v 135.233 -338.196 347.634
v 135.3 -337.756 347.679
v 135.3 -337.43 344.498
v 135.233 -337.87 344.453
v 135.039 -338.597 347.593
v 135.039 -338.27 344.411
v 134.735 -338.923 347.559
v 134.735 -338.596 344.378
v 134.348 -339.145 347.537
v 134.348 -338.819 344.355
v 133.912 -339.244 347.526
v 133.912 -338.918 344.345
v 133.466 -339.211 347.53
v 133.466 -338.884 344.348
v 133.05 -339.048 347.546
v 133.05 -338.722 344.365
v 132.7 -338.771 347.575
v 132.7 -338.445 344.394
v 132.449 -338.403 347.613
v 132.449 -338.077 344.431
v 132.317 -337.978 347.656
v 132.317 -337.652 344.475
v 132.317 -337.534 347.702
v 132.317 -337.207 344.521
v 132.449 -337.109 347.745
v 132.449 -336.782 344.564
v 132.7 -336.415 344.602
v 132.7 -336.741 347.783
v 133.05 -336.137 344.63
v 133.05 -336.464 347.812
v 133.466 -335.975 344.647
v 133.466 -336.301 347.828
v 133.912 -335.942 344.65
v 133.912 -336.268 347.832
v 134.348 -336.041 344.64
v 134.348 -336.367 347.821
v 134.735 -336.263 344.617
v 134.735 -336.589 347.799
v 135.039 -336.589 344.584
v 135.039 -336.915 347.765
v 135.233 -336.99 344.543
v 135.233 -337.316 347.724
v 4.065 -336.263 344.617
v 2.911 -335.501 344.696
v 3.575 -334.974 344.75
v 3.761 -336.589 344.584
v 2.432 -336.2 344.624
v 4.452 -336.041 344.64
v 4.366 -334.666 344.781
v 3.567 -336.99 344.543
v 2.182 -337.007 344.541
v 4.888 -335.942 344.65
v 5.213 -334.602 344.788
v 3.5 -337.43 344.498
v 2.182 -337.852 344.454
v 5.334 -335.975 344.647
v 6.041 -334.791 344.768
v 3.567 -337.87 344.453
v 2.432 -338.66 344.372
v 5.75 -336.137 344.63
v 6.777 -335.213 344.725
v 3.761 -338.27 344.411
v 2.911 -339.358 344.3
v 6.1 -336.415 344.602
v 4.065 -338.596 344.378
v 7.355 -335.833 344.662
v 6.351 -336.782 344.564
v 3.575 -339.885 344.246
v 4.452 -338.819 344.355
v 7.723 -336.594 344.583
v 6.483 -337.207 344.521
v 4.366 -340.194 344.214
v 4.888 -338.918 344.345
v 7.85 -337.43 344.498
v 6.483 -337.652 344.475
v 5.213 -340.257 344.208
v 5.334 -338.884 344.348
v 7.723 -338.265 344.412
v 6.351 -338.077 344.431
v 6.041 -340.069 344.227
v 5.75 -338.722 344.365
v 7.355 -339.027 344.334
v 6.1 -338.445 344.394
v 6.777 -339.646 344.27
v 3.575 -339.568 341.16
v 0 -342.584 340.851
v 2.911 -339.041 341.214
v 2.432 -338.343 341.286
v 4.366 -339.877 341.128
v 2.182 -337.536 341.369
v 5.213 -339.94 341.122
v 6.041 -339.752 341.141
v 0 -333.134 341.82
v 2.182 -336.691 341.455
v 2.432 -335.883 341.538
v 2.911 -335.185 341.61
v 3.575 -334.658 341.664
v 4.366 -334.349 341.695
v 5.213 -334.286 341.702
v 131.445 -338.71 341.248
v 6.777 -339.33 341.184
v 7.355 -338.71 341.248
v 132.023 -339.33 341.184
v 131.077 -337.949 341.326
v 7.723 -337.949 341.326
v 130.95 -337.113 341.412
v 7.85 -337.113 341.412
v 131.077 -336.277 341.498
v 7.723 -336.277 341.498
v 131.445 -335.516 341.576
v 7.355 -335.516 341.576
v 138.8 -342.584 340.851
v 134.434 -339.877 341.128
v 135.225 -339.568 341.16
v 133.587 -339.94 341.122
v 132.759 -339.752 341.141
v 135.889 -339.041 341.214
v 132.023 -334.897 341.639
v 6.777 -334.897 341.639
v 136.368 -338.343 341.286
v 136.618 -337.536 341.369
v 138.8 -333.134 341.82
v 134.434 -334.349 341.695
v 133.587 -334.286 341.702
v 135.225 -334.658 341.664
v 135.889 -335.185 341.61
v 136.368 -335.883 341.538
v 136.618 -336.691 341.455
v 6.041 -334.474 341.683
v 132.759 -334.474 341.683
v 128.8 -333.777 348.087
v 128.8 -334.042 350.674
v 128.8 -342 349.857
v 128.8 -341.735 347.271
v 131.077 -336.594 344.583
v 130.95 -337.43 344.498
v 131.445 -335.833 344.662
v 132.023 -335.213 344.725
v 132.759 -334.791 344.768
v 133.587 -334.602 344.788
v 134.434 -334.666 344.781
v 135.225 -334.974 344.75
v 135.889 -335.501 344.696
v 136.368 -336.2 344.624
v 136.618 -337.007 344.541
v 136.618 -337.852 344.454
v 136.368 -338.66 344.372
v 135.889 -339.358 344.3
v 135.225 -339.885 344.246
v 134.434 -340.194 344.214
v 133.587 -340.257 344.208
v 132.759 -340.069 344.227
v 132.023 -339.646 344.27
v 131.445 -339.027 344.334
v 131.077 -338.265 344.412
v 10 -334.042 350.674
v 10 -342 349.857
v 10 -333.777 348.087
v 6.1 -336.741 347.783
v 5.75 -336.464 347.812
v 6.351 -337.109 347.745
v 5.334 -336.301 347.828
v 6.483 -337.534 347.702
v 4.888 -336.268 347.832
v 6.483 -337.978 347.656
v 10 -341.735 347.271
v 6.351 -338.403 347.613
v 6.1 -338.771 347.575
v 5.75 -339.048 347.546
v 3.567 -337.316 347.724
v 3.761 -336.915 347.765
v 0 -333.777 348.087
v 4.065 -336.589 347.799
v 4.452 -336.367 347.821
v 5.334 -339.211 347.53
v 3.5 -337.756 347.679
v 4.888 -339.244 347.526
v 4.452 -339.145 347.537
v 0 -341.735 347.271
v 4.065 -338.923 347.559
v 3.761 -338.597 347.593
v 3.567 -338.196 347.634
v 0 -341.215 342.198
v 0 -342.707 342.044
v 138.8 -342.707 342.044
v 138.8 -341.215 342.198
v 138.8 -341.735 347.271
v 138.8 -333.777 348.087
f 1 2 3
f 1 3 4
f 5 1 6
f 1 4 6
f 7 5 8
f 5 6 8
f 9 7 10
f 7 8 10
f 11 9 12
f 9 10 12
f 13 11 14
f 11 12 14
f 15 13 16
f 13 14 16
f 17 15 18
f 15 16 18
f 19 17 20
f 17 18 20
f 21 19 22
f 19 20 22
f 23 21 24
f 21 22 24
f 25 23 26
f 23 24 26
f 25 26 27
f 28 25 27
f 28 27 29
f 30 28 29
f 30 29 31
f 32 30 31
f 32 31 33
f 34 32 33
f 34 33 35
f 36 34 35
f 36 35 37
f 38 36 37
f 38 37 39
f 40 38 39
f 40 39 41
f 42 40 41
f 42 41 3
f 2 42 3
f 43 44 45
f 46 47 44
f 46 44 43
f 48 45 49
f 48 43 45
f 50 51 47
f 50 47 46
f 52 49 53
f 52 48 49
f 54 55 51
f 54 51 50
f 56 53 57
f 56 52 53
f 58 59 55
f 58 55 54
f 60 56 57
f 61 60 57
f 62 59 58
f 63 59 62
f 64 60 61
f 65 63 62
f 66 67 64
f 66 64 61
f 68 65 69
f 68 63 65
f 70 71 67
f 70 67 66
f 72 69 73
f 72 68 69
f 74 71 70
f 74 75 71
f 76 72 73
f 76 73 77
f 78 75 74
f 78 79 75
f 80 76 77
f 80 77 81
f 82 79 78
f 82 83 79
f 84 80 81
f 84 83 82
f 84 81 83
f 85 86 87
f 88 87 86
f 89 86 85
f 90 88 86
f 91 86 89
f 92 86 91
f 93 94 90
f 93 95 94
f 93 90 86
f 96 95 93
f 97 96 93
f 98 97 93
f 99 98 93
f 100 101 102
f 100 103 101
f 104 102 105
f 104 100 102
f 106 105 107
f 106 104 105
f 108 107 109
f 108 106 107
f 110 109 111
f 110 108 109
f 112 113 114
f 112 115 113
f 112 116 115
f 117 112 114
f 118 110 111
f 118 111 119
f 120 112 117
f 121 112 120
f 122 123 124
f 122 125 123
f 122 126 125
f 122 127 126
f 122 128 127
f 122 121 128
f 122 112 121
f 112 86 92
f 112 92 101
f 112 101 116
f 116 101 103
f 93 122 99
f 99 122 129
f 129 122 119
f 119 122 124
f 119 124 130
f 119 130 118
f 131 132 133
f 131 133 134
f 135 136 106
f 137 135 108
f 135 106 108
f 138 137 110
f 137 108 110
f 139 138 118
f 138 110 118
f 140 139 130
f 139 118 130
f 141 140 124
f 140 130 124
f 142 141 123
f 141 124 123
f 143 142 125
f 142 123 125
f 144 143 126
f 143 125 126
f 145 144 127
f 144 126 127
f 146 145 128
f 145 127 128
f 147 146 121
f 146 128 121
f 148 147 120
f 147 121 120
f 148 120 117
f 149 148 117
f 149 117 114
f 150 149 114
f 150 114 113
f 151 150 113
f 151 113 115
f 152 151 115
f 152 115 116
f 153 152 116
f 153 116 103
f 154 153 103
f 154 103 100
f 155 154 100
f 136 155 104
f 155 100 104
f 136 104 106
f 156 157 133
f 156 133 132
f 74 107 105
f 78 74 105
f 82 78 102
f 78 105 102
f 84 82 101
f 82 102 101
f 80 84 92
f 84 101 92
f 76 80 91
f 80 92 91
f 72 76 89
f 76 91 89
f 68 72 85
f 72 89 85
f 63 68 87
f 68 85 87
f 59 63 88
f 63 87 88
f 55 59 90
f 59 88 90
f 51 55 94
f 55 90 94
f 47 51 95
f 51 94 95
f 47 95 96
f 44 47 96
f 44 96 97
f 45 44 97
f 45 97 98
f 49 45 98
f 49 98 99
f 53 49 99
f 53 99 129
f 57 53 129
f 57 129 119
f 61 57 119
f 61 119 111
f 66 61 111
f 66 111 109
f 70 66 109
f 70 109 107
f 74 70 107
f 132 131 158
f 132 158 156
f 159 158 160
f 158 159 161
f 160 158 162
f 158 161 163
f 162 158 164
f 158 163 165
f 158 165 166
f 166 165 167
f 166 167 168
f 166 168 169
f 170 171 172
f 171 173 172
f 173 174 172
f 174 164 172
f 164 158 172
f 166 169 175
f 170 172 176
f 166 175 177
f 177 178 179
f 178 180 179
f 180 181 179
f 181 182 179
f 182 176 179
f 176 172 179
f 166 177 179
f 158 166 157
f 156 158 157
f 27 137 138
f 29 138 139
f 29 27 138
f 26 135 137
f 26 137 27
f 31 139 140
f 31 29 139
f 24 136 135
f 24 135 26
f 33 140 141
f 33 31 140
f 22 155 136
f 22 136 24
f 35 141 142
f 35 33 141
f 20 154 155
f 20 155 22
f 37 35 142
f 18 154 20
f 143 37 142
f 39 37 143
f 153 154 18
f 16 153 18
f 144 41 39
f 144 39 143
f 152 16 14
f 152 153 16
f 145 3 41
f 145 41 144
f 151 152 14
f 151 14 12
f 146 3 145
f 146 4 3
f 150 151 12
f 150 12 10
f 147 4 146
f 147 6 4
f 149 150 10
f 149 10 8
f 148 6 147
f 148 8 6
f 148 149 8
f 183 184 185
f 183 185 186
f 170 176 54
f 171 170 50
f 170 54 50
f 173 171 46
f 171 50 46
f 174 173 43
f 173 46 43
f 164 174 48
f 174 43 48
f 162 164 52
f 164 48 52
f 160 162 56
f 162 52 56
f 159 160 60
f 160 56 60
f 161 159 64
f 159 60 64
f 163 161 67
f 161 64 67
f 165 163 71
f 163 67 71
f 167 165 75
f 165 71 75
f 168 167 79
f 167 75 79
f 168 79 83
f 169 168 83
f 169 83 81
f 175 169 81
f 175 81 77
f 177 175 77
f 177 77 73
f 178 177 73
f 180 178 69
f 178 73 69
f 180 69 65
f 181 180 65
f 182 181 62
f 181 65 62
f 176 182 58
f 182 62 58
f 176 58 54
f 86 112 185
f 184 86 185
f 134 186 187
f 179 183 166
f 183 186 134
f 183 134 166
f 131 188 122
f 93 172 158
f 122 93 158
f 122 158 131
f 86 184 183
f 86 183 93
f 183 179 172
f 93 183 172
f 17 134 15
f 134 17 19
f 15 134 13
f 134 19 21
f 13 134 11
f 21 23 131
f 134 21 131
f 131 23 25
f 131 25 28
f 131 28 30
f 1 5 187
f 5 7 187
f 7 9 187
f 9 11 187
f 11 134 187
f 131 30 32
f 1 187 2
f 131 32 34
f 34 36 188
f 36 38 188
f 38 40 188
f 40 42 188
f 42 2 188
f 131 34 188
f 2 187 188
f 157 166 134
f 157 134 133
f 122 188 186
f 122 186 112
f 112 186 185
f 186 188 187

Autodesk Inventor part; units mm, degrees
ref_plane "YZ Plane" through (0, 0, 0) normal (1, 0, 0) x (0, 1, 0)
ref_plane "XZ Plane" through (0, 0, 0) normal (0, 1, 0) x (-1, 0, 0)
ref_plane "XY Plane" through (0, 0, 0) normal (0, 0, 1) x (1, 0, 0)
sketch "Skizze2" plane through (0, 0, 0) normal (1, 0, 0) x (0, 1, 0)
  line L0 (-333.777, 348.0872) -> (-334.0423, 350.6737)
  line L1 (-333.777, 348.0872) -> (-333.134, 341.8201)
  line L2 (-333.134, 341.8201) -> (-342.5844, 340.8506)
  line L3 (-342.0005, 349.8573) -> (-334.0423, 350.6737)
  line L4 (-342.7069, 342.0444) -> (-341.2147, 342.1975)
  line L5 (-342.7069, 342.0444) -> (-342.5844, 340.8506)
  line L6 (-333.134, 341.8201) -> (-342.5844, 340.8506)
  line L7 (-333.777, 348.0872) -> (-333.134, 341.8201)
  line L8 (-333.777, 348.0872) -> (-341.7352, 347.2708)
  line L9 (-341.2147, 342.1975) -> (-341.7352, 347.2708)
  line L10 (-342.7069, 342.0444) -> (-342.5844, 340.8506)
  line L11 (-341.7352, 347.2708) -> (-342.0005, 349.8573)
  point P0 (0, 0)
extrude "Extrusion1" add sketch "Skizze2" along normal blind 69.4
sketch "Skizze3" plane through (0, 0, 0) normal (-1, 0, 0) x (0, 0, 1)
  line L0 (342.0444, -342.7069) -> (342.1975, -341.2147) projected
  line L1 (342.0444, -342.7069) -> (340.8506, -342.5844) projected
  line L2 (341.8201, -333.134) -> (340.8506, -342.5844) projected
  line L3 (348.0872, -333.777) -> (341.8201, -333.134) projected
  line L4 (348.0872, -333.777) -> (347.2708, -341.7352) projected
  line L5 (342.1975, -341.2147) -> (347.2708, -341.7352) projected
  line L6 (350.6737, -334.0423) -> (349.8573, -342.0005) projected
  line L7 (349.8573, -342.0005) -> (347.2708, -341.7352)
  line L8 (349.8573, -342.0005) -> (342.1975, -341.2147) projected
  line L9 (341.8201, -333.134) -> (350.6737, -334.0423) projected
  line L10 (350.6737, -334.0423) -> (348.0872, -333.777)
  point P0 (0, 0)
extrude "Extrusion2" cut sketch "Skizze3" against normal blind 10 contours L4 L9 L6 L7
sketch "Skizze4" plane through (0, -333.134, 341.8201) normal (0, 0.1020498, -0.9947793) x (1, 0, 0)
  line L0 (5, 0) -> (5, 9.5) construction
  line L1 (0, 9.5) -> (69.4, 9.5) construction
  circle A0 centre (5, 4) radius 2.85
  circle A1 centre (5, 4) radius 1.5 construction
  point P0 (0, -296.5122)
  dimension "d4" = 5.7
extrude "Extrusion3" cut sketch "Skizze4" against normal blind 3.1
sketch "Skizze5" plane through (5, -337.4295, 344.4957) normal (0, 0.1020498, -0.9947793) x (-1, 0, 0)
  circle A0 centre (0, 0) radius 2.85 projected
  circle A1 centre (0, 0) radius 1.5
  point P0 (5, 300.5122)
  dimension "d9" = 3
extrude "Extrusion4" cut sketch "Skizze5" against normal blind 3.4 contours A1
mirror "Spiegeln1" about plane through (69.4, -337.8887, 348.9722) normal (1, 0, 0) of "Extrusion4", "Extrusion3", "Extrusion2", "Extrusion1"
properties part number "Case_bottom_front"
